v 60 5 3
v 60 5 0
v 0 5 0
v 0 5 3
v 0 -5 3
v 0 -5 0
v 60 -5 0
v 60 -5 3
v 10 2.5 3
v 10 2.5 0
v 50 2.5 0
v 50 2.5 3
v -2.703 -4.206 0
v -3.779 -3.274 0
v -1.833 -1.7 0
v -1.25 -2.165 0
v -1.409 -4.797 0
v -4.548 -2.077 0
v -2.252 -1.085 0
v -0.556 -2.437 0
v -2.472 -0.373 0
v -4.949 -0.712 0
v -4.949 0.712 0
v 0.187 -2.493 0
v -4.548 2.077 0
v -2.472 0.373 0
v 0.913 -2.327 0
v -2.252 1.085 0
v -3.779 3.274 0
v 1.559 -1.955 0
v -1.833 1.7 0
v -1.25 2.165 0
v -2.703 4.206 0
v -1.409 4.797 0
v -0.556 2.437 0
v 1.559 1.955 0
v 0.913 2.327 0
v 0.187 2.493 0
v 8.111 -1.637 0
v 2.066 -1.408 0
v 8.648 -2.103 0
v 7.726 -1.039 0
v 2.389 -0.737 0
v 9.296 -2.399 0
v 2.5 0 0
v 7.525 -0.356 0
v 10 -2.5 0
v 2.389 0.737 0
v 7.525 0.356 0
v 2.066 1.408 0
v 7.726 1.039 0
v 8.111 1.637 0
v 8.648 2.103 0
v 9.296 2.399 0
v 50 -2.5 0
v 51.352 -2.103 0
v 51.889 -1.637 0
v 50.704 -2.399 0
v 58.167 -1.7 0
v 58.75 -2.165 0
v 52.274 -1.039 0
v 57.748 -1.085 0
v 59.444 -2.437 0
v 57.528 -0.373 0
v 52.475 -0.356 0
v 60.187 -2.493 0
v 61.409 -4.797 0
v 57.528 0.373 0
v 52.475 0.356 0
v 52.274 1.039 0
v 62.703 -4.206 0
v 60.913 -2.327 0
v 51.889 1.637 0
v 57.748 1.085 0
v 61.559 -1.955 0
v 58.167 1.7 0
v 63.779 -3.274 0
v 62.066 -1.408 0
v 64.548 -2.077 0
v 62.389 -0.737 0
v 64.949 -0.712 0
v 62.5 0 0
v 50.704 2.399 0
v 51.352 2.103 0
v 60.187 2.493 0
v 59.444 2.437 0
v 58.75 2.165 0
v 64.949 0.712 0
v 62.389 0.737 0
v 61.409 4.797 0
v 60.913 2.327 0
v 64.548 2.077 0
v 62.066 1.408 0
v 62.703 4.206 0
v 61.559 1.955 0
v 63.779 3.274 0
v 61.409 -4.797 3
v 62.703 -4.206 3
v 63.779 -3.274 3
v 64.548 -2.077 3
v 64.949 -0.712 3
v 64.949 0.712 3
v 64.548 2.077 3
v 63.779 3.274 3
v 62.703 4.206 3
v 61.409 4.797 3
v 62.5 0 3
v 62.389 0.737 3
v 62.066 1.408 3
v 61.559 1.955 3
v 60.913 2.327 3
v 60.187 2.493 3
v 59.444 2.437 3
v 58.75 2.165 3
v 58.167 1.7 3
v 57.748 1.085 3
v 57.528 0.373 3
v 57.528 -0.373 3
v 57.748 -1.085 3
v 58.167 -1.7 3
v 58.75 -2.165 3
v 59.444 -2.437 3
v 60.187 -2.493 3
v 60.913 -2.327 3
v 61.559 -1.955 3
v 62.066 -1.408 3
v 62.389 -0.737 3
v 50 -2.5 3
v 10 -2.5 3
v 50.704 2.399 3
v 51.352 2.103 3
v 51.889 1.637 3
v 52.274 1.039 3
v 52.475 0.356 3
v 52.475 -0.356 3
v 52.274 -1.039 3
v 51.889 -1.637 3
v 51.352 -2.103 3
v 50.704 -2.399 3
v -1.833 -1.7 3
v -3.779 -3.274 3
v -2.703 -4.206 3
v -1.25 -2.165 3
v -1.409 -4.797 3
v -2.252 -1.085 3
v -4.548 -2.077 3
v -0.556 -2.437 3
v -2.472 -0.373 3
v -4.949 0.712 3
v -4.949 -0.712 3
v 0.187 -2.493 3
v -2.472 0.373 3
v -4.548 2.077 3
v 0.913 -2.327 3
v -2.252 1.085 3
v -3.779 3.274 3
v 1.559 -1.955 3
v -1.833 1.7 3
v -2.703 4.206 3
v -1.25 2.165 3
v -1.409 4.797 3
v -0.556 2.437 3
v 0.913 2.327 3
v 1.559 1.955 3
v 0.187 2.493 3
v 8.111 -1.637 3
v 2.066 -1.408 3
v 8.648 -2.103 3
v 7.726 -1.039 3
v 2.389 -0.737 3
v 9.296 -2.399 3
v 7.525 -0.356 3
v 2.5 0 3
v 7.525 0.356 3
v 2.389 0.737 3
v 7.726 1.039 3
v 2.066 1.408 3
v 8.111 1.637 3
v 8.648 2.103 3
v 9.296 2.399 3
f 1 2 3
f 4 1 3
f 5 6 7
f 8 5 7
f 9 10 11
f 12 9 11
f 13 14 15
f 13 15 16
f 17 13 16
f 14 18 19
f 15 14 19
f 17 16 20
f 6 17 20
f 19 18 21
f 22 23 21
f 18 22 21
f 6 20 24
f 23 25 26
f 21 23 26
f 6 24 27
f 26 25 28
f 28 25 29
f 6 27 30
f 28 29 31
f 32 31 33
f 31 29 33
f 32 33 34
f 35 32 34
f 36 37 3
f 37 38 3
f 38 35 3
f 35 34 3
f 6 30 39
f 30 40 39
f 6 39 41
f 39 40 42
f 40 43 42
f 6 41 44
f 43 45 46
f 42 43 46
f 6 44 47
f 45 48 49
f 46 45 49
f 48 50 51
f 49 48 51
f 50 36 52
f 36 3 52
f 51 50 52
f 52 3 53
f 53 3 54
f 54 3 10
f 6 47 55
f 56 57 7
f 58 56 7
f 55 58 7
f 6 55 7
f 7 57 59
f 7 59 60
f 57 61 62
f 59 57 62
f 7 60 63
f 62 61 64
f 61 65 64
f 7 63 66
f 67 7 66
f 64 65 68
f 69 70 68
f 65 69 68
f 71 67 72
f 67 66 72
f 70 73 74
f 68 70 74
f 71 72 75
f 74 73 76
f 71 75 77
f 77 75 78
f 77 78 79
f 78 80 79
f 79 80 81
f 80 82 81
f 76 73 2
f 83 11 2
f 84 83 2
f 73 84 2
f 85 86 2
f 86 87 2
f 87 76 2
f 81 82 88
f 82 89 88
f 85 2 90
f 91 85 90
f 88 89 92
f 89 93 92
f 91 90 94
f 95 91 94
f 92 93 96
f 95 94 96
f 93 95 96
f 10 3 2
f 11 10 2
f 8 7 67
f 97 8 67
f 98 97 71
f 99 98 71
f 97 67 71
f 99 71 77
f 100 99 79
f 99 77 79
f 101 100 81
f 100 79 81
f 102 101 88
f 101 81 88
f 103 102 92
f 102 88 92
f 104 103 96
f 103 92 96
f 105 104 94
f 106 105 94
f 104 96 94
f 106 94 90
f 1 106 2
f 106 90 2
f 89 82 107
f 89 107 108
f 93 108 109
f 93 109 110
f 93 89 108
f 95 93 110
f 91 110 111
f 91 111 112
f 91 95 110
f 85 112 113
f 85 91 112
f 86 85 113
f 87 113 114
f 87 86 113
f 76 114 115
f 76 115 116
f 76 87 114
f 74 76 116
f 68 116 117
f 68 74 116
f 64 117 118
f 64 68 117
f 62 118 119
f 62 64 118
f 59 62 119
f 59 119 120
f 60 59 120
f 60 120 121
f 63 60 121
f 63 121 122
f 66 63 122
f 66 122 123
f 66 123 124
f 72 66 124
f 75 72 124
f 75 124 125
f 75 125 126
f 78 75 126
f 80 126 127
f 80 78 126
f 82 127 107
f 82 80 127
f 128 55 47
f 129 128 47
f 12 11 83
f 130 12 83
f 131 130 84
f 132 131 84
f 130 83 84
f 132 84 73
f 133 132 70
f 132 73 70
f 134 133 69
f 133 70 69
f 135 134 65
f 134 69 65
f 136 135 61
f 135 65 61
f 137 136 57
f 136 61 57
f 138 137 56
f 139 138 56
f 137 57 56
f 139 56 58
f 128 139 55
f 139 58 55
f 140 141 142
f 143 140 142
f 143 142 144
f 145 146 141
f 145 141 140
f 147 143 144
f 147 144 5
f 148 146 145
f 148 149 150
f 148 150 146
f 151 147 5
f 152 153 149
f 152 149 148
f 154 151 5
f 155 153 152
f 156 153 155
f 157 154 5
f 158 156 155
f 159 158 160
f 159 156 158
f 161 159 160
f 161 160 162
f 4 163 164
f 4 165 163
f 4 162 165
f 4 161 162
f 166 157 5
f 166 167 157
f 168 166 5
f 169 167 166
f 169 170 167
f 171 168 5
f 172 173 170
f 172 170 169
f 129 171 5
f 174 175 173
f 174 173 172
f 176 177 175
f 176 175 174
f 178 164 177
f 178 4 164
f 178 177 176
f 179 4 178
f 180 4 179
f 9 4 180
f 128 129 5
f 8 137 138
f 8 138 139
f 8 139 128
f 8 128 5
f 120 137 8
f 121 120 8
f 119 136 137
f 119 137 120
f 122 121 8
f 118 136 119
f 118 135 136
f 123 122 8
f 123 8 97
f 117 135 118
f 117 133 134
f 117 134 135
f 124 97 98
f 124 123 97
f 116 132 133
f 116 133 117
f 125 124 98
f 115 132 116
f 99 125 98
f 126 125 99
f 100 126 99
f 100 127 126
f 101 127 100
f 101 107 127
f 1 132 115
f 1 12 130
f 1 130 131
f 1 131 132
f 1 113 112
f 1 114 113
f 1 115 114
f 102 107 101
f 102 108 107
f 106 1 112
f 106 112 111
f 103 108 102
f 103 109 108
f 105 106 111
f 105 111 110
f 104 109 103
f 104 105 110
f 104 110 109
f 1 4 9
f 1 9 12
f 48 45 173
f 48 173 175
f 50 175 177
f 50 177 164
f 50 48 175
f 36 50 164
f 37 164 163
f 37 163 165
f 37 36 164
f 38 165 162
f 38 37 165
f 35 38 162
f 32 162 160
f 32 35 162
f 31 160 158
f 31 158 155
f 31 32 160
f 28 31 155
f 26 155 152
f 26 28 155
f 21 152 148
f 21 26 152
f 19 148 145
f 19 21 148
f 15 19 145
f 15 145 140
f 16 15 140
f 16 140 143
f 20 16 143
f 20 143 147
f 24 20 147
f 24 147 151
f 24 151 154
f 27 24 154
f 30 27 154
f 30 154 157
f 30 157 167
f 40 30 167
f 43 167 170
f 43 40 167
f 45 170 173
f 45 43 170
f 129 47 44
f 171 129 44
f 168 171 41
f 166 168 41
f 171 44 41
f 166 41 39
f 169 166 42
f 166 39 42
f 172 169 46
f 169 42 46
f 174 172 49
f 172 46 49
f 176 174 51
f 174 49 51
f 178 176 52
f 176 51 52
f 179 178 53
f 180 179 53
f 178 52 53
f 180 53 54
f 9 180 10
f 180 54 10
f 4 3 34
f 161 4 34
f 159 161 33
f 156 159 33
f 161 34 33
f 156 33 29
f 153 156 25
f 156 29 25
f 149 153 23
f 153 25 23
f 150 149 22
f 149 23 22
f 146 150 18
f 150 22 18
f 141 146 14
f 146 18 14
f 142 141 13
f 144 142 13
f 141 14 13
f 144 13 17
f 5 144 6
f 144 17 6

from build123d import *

# Parameters (mm, degrees)
F0_R     = 2.5
F1_DEPTH = 3


with BuildPart() as f1:
    # F0 (on Top) → F1 (new body)
    with BuildSketch(Plane.XY):
        with BuildLine():
            Line((60, 5), (0, 5))
            ThreePointArc((0, 5), (-5, 0), (0, -5))
            Line((0, -5), (60, -5))
            ThreePointArc((60, -5), (65, 0), (60, 5))
        make_face()
        Circle(F0_R, mode=Mode.SUBTRACT)
        with BuildLine():
            ThreePointArc((10, -2.5), (7.5, 0), (10, 2.5))
            Line((10, 2.5), (50, 2.5))
            ThreePointArc((50, 2.5), (52.5, 0), (50, -2.5))
            Line((50, -2.5), (10, -2.5))
        make_face(mode=Mode.SUBTRACT)
        with Locations((60, 0)):
            Circle(F0_R, mode=Mode.SUBTRACT)
    extrude(amount=F1_DEPTH)


solid = f1.part
